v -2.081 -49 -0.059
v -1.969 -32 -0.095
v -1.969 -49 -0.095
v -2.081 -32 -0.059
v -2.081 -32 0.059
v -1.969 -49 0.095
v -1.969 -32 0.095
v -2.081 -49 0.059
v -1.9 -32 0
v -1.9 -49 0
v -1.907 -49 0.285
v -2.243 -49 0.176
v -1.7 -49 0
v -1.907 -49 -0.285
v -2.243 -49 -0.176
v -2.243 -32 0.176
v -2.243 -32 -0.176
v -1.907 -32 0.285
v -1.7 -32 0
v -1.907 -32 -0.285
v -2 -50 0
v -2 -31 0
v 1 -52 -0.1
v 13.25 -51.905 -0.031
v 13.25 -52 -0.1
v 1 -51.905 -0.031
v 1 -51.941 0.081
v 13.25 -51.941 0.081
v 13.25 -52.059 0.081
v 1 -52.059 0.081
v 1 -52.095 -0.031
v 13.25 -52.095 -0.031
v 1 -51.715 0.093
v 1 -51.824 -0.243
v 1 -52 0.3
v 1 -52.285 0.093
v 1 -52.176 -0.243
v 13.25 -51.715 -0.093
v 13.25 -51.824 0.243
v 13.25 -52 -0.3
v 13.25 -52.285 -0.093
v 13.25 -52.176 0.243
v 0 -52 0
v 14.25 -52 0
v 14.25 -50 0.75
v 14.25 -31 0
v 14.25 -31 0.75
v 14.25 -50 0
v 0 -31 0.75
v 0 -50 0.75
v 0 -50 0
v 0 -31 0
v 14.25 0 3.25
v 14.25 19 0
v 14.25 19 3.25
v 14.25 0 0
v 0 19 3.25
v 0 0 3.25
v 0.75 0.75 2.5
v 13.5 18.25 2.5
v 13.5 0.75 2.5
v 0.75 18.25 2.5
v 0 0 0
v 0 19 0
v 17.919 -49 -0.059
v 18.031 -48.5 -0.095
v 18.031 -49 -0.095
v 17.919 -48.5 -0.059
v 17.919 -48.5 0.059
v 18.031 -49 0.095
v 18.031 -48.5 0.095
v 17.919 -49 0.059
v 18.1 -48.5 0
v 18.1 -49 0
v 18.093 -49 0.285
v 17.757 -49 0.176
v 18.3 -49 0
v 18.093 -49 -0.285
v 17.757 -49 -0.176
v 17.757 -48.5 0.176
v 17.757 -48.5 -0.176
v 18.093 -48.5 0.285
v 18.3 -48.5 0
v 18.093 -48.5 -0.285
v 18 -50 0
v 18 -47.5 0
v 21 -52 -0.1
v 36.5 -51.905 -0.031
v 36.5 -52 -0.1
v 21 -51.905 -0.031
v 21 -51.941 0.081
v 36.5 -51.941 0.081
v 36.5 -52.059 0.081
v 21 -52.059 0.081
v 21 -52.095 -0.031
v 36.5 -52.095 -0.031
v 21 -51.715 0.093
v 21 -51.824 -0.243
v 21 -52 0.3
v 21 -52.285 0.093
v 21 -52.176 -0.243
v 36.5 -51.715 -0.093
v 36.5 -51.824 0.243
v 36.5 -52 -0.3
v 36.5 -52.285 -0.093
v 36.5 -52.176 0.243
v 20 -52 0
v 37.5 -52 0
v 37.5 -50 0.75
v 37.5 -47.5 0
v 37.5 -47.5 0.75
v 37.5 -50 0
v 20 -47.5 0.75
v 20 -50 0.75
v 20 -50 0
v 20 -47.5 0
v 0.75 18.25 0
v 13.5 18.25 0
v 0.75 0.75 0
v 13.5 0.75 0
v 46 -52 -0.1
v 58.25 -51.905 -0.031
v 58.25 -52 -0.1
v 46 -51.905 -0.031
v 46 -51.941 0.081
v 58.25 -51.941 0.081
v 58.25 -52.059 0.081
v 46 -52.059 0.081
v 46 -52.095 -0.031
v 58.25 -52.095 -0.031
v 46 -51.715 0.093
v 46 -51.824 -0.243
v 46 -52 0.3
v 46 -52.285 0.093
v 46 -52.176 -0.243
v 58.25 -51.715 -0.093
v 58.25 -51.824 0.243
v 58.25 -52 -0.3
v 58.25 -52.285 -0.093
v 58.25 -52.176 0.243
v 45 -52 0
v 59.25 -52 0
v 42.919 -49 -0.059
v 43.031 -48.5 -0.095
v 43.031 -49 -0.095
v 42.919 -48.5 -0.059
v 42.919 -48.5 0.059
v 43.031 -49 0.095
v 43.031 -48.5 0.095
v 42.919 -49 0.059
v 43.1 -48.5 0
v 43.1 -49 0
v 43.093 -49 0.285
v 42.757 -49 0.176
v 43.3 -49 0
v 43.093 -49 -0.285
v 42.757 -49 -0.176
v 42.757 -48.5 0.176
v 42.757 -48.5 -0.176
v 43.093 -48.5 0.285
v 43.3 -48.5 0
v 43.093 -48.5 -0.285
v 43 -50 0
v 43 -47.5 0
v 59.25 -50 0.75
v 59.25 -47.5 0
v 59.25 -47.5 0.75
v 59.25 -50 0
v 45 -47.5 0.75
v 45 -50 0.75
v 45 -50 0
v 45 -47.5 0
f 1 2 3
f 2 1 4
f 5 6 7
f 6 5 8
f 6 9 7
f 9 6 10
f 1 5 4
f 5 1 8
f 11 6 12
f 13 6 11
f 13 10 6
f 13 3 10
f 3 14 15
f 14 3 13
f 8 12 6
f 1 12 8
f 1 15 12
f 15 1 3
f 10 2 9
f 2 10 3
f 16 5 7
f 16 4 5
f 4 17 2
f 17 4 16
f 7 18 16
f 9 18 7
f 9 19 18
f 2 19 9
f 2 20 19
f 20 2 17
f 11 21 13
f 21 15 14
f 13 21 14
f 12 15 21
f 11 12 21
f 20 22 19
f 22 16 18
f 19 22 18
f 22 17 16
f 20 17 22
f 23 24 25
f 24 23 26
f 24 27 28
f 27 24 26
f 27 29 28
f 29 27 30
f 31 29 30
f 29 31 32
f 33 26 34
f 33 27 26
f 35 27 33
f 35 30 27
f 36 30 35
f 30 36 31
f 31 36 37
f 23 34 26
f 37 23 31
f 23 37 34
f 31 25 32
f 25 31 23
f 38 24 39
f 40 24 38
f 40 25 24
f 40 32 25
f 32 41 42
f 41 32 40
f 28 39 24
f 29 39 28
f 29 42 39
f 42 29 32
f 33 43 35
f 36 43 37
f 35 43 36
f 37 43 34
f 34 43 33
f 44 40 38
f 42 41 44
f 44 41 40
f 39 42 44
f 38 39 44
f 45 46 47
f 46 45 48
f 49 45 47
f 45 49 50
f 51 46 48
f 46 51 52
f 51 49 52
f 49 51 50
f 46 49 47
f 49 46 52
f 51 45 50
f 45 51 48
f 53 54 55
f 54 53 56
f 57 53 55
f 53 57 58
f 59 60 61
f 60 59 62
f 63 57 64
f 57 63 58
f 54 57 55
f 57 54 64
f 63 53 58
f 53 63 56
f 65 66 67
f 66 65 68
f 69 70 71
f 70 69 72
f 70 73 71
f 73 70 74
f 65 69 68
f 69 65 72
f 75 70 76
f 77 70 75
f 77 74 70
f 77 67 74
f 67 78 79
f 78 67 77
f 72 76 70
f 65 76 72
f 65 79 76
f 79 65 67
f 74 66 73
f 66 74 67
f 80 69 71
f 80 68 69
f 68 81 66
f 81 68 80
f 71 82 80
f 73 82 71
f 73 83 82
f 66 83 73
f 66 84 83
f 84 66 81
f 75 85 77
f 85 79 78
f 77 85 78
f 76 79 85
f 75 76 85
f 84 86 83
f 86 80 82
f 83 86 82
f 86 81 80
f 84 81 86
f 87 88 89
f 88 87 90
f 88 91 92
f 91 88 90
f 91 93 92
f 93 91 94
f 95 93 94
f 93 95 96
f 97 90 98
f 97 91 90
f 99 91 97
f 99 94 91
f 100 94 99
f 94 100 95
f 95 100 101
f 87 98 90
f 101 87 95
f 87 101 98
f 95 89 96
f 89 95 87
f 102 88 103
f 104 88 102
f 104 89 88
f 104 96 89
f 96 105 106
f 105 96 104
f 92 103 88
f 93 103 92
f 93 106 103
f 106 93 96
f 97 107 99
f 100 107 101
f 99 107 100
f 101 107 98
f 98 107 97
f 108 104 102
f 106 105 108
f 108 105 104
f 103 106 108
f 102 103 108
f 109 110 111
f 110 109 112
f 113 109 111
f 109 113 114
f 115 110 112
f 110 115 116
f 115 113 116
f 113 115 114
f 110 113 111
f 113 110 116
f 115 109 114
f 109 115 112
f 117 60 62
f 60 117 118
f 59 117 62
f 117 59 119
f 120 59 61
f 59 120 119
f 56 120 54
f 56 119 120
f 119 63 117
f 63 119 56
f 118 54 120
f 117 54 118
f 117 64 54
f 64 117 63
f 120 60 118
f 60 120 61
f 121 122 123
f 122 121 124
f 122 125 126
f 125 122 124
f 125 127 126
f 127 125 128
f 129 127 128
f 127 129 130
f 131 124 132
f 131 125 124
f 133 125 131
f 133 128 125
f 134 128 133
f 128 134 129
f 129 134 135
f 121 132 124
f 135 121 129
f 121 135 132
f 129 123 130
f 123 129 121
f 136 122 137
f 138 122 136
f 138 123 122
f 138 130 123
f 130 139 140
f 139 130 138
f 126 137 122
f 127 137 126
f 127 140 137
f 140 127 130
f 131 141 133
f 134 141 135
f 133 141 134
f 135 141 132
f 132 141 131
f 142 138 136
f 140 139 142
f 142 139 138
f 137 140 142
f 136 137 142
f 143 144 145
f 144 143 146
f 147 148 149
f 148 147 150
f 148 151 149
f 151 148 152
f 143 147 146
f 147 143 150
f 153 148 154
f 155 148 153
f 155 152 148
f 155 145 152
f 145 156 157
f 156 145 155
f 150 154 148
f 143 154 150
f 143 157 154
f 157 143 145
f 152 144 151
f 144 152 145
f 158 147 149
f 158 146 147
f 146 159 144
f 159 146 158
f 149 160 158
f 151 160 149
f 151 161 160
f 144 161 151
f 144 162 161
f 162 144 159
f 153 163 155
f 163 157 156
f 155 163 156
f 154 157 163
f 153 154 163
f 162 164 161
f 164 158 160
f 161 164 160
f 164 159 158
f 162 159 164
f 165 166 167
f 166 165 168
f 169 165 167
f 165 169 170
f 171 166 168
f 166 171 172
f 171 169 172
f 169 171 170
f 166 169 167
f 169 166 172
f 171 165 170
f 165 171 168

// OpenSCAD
Thick = 0.75;

//--------------------------------------------------------------------------------------------------
// Common moudles
//--------------------------------------------------------------------------------------------------

// X dimensional arrow
module arrow_x(l)
{
    line_w = 0.1;
    arrow_w = 1;
    arrow_h = 0.3;

    // Line
    translate([l / 2, 0, 0])
    {
        rotate([0, 90, 0])
        {
            color([0.4, 0.4, 0.4])
            cylinder(l - arrow_w * 2, line_w, line_w, true);
        }
    }

    // Left arrow
    translate([arrow_w, 0, 0])
    {
        rotate([0, 270, 0])
        {
            color([0.4, 0.4, 0.4])
            cylinder(arrow_w, arrow_h, 0, false);
        }
    }

    // Right arrow
    translate([l - arrow_w, 0, 0])
    {
        rotate([0, 90, 0])
        {
            color([0.4, 0.4, 0.4])
            cylinder(arrow_w, arrow_h, 0, false);
        }
    }

    // Text
    translate([l/3, 0.5, 0])
    {
        color([0.4, 0.4, 0.4])
        text(str(l), size=1);
    }
}

// Y dimensional arrow
module arrow_y(l)
{
    line_w = 0.1;
    arrow_w = 1;
    arrow_h = 0.3;

    // Line
    translate([0, l / 2, 0])
    {
        rotate([90, 0, 00])
        {
            color([0.4, 0.4, 0.4])
            cylinder(l - arrow_w * 2, line_w, line_w, true);
        }
    }

    // Left arrow
    translate([0 ,arrow_w, 0])
    {
        rotate([90, 0, 0])
        {
            color([0.4, 0.4, 0.4])
            cylinder(arrow_w, arrow_h, 0, false);
        }
    }

    // Right arrow
    translate([0, l - arrow_w, 0])
    {
        rotate([270, 0, 0])
        {
            color([0.4, 0.4, 0.4])
            cylinder(arrow_w, arrow_h, 0, false);
        }
    }

    // Text
    translate([-0.5, l/3, 0])
    {
        rotate([0 ,0, 90])
        {
            color([0.4, 0.4, 0.4])
            text(str(l), size=1);
        }
    }
}

module dimension(x, y, z, r, g, b, dx, dy = 50)
{
    
    translate([dx, -dy, 0])
    {
        color([r, g, b])
        cube([x, y, z]);

        translate([-2, 0, 0])
        {
            arrow_y(y);
        }

        translate([0, -2, 0])
        {
            arrow_x(x);
        }
    }
}

DimensionY = 50;

module board(x, y, z, r, g, b, posX, posY, posZ, rotX, rotY, rotZ, dimX, dimY = DimensionY)
{
    translate([posX, posY, posZ])
    {
        rotate([rotX, rotY, rotZ])
        {
            color([r, g, b])
            cube([x, y, z]);
        }
    }

    dimension(x, y, z, r, g, b, dimX, dimY);
}

//------------------------------------------------------------------------------
// Draw parts
//------------------------------------------------------------------------------

// Bottom
board(
    14.25, 19, Thick,
    0.7, 0.7, 1.0,
    0, 0, 3.25 - Thick,
    0, 0, 0,
    0, DimensionY);


// Side boards
board(
    19 - Thick * 2, 3.25 - Thick, Thick,
    0.7, 1.0, 1.0,
    0, Thick, 0,
    90, 0, 90,
    20, DimensionY);

board(
    19 - Thick * 2, 3.25 - Thick, Thick,
    0.7, 1.0, 1.0,
    14.25 - Thick, Thick, 0,
    90, 0, 90,
    20, DimensionY);

// Front
board(
    14.25, 3.25 - Thick, Thick,
    0.7, 0.2, 0.3,
    0, Thick, 0,
    90, 0, 0,
    45, DimensionY);

board(
    14.25, 3.25 - Thick, Thick,
    0.7, 0.2, 0.3,
    0, 19, 0,
    90, 0, 0,
    45, DimensionY);
